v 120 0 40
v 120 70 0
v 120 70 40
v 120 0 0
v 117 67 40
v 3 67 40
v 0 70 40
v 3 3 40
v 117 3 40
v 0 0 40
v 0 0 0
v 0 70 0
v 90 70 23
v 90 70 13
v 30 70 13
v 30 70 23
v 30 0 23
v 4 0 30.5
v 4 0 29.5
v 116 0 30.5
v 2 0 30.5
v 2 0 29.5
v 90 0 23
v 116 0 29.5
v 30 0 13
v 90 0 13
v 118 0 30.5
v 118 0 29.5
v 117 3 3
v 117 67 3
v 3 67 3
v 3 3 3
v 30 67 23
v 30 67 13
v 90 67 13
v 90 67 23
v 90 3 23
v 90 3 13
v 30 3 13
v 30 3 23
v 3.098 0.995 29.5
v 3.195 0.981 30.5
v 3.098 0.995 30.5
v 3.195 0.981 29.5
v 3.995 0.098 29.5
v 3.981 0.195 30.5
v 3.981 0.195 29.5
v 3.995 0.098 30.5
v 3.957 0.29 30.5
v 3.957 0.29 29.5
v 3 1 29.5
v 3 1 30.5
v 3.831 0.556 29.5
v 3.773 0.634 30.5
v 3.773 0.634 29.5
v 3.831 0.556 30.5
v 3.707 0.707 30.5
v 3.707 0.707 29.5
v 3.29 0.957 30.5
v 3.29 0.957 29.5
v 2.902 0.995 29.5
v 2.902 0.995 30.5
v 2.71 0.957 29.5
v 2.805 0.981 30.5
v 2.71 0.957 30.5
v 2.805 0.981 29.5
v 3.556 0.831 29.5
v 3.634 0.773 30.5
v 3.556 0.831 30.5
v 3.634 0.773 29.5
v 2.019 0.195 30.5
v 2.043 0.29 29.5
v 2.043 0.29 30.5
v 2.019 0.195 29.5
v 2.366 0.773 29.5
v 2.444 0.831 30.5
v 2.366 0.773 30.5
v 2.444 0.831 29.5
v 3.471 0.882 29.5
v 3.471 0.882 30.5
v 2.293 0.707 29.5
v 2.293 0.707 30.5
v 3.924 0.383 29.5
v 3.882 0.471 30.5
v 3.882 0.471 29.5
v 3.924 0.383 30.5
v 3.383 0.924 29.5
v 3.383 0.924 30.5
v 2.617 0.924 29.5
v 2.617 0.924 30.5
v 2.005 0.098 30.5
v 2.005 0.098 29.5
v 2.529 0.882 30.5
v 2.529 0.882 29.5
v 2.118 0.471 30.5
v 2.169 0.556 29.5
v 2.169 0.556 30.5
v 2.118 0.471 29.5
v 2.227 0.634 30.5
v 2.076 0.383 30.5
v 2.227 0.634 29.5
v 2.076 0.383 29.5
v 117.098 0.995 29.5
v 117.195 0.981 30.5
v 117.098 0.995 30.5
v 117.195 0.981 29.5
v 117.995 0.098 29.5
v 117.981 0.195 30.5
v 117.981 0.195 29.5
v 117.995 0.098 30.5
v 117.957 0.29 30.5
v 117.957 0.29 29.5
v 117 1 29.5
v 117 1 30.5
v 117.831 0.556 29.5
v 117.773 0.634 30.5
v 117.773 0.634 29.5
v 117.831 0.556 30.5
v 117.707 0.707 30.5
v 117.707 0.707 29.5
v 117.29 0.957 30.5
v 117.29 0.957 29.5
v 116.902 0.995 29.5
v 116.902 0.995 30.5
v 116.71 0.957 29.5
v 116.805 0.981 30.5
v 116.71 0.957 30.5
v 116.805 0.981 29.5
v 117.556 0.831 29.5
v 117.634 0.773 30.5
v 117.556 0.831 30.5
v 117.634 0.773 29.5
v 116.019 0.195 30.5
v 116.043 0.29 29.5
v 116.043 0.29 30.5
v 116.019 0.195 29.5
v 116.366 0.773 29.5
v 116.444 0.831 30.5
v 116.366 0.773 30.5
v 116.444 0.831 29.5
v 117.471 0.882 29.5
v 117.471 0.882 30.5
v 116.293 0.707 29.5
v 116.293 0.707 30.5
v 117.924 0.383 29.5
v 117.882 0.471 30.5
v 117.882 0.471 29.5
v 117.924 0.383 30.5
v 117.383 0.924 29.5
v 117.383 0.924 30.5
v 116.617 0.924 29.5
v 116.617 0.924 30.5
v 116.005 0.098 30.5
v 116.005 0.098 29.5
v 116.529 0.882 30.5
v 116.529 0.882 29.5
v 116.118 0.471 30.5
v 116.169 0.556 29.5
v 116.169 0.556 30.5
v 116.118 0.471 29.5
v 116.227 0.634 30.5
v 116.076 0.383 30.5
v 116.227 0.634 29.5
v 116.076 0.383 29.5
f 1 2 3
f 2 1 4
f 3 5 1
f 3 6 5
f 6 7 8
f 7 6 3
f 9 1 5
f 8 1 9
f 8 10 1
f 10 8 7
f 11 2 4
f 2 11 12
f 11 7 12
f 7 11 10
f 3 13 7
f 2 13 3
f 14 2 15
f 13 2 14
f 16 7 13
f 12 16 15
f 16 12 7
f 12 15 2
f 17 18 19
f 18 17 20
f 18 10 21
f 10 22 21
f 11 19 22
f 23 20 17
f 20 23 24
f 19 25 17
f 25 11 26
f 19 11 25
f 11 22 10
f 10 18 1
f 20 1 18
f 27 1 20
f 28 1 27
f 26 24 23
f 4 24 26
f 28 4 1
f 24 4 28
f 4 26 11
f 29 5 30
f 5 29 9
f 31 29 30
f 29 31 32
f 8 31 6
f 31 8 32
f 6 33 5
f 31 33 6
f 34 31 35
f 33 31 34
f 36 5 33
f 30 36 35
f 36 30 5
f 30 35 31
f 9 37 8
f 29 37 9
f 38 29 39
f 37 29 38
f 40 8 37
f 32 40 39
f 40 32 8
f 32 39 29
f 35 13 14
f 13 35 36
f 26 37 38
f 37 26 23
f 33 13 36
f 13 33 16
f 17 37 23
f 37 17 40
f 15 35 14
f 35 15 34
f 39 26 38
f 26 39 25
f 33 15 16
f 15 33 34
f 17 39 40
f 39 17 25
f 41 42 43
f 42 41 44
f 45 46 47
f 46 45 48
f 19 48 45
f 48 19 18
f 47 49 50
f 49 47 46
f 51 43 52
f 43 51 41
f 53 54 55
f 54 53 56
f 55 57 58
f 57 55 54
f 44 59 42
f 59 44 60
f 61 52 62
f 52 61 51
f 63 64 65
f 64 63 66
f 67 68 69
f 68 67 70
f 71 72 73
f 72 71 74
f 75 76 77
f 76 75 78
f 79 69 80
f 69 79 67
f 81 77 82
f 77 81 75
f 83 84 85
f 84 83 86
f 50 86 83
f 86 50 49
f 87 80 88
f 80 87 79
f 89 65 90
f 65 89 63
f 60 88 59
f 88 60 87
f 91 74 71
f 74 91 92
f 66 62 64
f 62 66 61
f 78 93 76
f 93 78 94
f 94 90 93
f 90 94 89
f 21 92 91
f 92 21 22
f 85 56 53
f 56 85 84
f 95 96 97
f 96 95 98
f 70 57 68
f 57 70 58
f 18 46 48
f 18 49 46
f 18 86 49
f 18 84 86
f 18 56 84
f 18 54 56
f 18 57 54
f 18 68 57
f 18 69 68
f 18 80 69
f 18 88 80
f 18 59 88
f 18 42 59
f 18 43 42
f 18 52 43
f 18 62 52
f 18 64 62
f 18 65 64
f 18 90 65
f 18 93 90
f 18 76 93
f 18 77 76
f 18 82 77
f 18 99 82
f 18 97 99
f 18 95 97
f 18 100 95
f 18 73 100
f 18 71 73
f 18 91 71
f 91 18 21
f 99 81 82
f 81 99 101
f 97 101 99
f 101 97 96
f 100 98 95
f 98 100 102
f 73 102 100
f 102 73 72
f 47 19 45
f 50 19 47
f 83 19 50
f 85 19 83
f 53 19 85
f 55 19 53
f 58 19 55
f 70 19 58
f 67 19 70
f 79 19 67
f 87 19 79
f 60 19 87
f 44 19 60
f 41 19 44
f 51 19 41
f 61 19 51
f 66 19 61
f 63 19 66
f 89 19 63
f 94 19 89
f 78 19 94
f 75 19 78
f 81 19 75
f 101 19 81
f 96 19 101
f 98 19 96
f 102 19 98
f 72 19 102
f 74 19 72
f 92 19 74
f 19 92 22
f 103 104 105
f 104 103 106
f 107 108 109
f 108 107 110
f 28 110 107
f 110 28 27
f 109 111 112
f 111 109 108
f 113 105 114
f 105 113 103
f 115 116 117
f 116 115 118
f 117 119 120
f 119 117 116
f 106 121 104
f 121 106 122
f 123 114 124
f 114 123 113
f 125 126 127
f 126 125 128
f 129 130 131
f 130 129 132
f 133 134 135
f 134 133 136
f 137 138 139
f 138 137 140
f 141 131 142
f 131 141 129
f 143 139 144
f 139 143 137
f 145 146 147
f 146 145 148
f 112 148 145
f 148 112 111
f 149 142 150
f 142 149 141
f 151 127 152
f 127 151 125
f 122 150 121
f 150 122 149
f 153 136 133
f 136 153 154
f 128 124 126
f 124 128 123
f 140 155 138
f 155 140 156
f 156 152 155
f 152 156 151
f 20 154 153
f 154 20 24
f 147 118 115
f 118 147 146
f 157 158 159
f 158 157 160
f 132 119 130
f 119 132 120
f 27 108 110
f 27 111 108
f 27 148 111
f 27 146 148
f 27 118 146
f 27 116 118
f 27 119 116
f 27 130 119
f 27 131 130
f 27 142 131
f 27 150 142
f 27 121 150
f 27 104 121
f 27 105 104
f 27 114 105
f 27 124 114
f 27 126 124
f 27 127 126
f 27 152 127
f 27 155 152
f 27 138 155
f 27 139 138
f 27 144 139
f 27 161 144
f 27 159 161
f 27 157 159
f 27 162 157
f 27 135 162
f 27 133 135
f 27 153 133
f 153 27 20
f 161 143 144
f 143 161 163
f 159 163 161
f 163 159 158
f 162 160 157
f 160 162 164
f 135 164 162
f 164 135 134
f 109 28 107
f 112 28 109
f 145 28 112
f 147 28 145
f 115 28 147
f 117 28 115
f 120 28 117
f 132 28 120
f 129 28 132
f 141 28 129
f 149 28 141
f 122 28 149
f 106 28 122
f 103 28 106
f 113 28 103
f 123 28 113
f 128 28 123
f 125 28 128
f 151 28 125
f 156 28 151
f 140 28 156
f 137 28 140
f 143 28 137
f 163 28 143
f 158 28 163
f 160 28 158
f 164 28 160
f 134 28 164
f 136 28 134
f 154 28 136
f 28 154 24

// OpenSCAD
// Buffer tank for mini horizontal gel-electrophoresis box
// Outer dimensions: 120 mm (X) x 70 mm (Y) x 40 mm (Z)
// Wall thickness: 3 mm
// Floor thickness: 3 mm
// Platform: 60 mm (X) x 70 mm (Y) x 10 mm (Z), centered in X, z = 13
// Electrode holes: 2 holes, 2 mm diameter, at z = 30, y = 0, at each X end

// Dimensions
tank_length = 120;   // X dimension
tank_width = 70;    // Y dimension
tank_height = 40;   // Z dimension
wall_thickness = 3; // Wall and floor thickness
platform_length = 60; // X dimension of platform
platform_width = 70;  // Y dimension of platform (full width)
platform_height = 10; // Z dimension of platform
platform_z = 13;    // Platform top height above floor (z = 3)
hole_diameter = 2;    // Electrode hole diameter
hole_z = 30;          // Electrode hole height

// Main tank body (outer dimensions)
outer = [tank_length, tank_width, tank_height];

// Inner dimensions (subtracting wall thickness)
inner_length = tank_length - 2 * wall_thickness;
inner_width = tank_width - 2 * wall_thickness;
inner_height = tank_height - wall_thickness;

// Platform dimensions (inner)
platform_inner_length = platform_length;
platform_inner_width = platform_width;

// Create the tank
difference() {
  // Outer shell
  cube(outer, center = false);
  
  // Inner hollow
  translate([wall_thickness, wall_thickness, wall_thickness]) {
    cube([inner_length, inner_width, inner_height], center = false);
  }
  
  // Platform (cut out from inner volume)
  translate([(tank_length - platform_length) / 2, 0, platform_z]) {
    cube([platform_length, platform_width, platform_height], center = false);
  }
  
  // Electrode holes (at each X end)
  // Left hole
  translate([wall_thickness, 0, hole_z]) {
    cylinder(h = 1, d = hole_diameter, center = true, $fn = 64);
  }
  
  // Right hole
  translate([tank_length - wall_thickness, 0, hole_z]) {
    cylinder(h = 1, d = hole_diameter, center = true, $fn = 64);
  }
}
